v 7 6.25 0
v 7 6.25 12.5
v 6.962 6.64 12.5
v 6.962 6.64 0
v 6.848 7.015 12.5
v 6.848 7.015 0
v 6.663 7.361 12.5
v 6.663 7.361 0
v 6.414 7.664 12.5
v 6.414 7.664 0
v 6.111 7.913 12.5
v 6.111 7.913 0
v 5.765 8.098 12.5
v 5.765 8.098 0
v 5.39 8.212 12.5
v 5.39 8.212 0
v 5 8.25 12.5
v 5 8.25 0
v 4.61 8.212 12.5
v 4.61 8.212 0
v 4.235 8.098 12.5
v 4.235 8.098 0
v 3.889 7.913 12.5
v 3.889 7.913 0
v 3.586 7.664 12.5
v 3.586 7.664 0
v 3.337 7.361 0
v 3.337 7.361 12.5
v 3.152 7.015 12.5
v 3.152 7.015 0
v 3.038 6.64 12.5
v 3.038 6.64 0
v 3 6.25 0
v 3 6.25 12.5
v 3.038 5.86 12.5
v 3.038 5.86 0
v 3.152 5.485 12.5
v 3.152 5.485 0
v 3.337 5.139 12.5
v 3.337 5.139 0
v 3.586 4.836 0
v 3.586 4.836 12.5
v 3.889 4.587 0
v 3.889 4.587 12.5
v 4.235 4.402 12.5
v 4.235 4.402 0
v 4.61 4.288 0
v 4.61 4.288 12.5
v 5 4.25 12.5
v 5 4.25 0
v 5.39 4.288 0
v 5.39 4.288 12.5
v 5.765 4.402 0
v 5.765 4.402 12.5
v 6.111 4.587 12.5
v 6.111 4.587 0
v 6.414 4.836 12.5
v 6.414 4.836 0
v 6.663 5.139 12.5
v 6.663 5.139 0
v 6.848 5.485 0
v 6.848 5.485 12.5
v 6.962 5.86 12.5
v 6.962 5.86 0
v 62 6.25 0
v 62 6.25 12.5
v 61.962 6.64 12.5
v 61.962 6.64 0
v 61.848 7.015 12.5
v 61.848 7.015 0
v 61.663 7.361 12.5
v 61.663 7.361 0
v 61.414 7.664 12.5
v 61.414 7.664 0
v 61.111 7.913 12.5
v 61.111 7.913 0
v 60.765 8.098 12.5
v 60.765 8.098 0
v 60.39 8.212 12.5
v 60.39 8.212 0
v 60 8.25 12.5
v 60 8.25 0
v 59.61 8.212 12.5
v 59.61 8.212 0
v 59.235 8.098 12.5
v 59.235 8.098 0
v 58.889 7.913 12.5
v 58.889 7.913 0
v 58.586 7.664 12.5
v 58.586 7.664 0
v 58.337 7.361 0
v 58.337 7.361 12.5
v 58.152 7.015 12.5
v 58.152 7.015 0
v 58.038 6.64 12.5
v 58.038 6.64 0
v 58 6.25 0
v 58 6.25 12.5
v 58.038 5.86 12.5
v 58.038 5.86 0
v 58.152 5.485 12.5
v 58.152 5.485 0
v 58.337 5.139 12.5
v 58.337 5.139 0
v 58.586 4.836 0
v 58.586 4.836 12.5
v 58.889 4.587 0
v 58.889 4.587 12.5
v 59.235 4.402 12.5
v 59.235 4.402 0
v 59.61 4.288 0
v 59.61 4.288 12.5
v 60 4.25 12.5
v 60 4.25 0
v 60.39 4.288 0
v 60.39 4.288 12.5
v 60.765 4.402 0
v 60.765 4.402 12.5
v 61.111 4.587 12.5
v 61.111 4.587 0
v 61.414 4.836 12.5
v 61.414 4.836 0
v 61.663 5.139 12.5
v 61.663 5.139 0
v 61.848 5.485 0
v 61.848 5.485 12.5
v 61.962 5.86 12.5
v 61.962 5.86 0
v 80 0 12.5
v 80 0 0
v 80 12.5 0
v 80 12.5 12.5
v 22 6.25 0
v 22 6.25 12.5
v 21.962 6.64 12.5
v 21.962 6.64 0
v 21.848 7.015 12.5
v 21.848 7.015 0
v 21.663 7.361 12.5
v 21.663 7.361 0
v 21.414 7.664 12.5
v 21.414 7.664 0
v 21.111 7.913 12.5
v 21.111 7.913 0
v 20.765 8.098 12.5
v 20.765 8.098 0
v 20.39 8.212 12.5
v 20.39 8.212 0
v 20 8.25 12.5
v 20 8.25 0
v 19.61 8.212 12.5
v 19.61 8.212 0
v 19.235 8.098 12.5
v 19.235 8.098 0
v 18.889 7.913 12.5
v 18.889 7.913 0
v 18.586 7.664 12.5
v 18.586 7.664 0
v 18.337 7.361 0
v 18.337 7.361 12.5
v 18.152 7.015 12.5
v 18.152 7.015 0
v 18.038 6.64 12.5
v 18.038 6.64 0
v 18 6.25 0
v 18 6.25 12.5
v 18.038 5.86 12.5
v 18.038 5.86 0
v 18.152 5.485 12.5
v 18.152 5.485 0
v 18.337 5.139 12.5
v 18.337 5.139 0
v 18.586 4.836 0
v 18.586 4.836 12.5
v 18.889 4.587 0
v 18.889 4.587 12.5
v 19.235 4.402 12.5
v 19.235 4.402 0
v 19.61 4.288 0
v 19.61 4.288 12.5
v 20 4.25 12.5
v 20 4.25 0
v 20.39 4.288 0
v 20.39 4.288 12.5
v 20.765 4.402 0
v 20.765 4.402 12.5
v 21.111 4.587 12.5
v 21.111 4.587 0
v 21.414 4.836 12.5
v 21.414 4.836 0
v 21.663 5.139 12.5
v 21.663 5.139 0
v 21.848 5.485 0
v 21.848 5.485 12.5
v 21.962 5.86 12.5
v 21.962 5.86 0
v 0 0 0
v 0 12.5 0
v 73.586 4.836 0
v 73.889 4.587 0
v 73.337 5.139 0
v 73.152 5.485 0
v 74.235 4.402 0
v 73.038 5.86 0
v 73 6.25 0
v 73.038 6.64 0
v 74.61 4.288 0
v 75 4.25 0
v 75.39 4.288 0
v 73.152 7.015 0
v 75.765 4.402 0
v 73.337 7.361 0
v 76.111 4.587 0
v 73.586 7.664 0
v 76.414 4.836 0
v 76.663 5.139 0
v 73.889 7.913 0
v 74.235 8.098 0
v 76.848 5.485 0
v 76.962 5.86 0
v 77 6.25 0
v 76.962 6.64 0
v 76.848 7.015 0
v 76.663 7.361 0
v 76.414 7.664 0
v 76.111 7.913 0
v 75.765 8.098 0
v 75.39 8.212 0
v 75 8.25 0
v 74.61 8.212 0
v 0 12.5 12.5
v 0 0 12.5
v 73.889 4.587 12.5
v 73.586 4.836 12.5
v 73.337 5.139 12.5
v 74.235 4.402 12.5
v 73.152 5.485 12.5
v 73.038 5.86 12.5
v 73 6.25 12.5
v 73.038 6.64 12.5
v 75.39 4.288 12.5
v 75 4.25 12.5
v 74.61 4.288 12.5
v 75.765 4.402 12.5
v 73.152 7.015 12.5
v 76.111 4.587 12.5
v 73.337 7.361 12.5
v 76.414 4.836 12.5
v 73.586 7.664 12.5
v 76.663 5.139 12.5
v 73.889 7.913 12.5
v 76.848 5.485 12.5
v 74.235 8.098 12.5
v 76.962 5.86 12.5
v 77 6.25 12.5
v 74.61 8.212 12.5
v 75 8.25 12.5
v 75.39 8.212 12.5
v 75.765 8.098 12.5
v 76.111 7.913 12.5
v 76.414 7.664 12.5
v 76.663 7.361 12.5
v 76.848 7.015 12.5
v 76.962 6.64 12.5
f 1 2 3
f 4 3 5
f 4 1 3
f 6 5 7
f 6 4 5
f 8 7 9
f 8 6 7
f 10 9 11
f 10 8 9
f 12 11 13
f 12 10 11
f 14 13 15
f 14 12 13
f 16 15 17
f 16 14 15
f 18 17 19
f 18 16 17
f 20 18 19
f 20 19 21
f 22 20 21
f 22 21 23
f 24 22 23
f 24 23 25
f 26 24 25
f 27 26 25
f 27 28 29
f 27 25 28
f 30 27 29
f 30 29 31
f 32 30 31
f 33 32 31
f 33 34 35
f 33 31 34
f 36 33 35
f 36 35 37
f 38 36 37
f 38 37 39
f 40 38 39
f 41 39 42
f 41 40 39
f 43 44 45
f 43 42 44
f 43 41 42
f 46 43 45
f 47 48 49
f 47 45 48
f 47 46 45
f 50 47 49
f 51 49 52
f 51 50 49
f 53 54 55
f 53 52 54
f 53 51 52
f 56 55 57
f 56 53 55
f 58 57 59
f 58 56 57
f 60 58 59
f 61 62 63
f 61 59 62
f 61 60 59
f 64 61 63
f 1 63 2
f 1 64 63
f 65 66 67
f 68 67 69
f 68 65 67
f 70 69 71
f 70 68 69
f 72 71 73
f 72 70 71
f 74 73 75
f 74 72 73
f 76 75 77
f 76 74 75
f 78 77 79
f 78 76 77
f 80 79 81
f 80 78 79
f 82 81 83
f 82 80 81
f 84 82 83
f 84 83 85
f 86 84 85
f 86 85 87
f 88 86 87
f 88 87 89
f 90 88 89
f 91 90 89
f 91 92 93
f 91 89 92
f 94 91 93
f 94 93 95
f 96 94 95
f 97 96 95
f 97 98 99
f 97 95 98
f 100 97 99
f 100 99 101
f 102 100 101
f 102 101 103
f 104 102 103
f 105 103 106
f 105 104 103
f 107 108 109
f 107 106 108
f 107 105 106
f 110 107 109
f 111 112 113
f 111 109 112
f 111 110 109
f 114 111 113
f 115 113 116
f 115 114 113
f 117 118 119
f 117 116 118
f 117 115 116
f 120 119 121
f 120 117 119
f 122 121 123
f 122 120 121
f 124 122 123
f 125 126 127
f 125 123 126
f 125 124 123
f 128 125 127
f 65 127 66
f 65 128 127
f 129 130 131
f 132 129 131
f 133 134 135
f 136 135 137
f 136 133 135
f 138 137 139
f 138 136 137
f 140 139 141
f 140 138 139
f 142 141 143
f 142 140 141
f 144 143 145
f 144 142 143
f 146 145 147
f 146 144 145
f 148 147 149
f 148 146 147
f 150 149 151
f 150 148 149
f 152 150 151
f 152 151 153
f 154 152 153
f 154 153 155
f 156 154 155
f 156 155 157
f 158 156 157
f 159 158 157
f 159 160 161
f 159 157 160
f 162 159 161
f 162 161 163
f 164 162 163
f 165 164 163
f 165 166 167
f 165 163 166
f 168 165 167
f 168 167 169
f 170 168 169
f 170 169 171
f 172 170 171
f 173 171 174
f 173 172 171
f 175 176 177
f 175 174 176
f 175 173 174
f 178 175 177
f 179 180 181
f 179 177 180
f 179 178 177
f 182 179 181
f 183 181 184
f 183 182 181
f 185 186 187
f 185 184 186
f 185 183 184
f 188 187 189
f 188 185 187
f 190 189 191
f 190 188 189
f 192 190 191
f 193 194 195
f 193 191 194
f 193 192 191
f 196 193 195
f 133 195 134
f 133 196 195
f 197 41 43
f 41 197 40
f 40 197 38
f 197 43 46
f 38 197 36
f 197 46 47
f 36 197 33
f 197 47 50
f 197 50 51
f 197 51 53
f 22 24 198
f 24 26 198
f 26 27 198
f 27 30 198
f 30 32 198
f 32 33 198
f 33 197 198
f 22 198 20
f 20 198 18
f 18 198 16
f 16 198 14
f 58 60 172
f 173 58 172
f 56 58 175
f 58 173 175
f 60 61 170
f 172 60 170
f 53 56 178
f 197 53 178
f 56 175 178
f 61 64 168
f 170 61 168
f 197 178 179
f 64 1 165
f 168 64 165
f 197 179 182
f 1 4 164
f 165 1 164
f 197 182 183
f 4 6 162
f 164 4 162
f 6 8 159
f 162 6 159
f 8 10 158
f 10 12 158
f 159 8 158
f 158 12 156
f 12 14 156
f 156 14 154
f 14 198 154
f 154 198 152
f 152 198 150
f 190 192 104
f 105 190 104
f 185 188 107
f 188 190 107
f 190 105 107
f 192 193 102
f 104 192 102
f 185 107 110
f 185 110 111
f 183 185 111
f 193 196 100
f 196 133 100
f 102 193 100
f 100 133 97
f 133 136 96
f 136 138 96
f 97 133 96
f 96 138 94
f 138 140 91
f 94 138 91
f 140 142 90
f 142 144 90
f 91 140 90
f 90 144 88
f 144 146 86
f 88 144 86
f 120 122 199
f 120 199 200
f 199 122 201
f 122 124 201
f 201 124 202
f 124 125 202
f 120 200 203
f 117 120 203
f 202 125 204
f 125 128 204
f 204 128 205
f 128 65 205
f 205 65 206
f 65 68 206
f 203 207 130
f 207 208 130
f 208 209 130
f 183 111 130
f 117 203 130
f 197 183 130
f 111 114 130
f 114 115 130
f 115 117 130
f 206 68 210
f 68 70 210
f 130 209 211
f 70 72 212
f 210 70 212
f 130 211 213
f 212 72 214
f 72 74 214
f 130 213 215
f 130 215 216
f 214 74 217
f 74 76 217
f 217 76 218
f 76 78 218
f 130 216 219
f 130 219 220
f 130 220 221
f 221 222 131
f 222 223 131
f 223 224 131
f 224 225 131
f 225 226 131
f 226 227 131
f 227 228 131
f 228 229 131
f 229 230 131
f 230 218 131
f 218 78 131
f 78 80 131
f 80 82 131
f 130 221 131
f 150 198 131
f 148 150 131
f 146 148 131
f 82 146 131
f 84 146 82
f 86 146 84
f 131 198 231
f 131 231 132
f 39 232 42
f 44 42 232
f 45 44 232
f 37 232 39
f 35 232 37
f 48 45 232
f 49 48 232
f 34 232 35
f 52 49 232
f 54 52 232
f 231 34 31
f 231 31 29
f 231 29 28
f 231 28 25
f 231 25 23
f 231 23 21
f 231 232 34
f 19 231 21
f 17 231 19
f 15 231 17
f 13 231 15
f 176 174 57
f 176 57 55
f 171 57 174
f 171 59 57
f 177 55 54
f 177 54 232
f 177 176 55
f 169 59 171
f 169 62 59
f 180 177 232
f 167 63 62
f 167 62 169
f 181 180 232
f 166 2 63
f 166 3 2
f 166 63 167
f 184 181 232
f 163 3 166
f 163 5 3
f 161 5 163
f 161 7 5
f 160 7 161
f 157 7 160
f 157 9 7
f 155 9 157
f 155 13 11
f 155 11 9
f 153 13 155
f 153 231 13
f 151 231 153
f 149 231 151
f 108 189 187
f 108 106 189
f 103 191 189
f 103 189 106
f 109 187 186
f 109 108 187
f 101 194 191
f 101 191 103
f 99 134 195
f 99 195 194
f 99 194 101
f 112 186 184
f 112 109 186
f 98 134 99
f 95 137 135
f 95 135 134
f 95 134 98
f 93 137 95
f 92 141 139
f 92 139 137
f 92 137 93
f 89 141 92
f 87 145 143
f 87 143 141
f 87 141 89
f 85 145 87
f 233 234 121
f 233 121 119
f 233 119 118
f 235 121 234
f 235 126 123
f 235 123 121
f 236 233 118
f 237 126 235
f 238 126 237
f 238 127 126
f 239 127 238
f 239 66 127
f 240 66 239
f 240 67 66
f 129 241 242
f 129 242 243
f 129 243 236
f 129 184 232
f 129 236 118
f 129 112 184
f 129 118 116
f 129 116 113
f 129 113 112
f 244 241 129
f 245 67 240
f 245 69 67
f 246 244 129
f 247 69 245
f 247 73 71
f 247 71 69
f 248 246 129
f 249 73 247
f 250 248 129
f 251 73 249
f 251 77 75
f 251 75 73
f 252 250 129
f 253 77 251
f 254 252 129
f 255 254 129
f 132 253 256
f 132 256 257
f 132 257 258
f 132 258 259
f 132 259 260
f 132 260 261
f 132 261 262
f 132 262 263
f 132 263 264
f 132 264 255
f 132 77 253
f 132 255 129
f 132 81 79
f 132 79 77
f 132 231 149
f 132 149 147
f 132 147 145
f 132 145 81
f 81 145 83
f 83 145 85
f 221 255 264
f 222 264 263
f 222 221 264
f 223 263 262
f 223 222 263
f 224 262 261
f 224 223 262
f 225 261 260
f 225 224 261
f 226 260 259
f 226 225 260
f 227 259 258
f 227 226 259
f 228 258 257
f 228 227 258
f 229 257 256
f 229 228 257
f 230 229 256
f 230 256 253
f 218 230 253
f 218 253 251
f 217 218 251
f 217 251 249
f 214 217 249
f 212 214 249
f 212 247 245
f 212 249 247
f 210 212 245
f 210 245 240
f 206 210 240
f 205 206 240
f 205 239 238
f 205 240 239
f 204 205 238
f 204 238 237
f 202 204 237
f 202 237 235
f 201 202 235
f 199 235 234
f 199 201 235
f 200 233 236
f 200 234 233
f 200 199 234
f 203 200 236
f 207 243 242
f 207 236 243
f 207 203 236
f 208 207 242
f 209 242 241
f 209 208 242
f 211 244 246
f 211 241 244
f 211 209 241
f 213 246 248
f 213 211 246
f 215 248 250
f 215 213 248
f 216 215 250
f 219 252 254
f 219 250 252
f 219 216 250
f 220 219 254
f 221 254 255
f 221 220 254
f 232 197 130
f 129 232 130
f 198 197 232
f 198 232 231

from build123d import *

# Parameters (mm, degrees)
CYLINDER001_R     = 2
CYLINDER001_DEPTH = 13
CYLINDER002_R     = 2
CYLINDER002_DEPTH = 13
CYLINDER003_R     = 2
CYLINDER003_DEPTH = 13
CYLINDER_R        = 2
CYLINDER_DEPTH    = 13
BOX_W             = 80
BOX_H             = 12.5
BOX_DEPTH         = 12.5


with BuildPart() as cylinder001:
    # Cylinder001 → Cylinder001 (new body)
    with BuildSketch(Plane(origin=(20, 6.25, 0), x_dir=(1, 0, 0), z_dir=(0, 0, 1))):
        Circle(CYLINDER001_R)
    extrude(amount=CYLINDER001_DEPTH)


with BuildPart() as cylinder002:
    # Cylinder002 → Cylinder002 (new body)
    with BuildSketch(Plane(origin=(75, 6.25, 0), x_dir=(1, 0, 0), z_dir=(0, 0, 1))):
        Circle(CYLINDER002_R)
    extrude(amount=CYLINDER002_DEPTH)


with BuildPart() as cylinder003:
    # Cylinder003 → Cylinder003 (new body)
    with BuildSketch(Plane(origin=(60, 6.25, 0), x_dir=(1, 0, 0), z_dir=(0, 0, 1))):
        Circle(CYLINDER003_R)
    extrude(amount=CYLINDER003_DEPTH)


with BuildPart() as agujeroseje:
    # Cylinder → Cylinder (new body)
    with BuildSketch(Plane(origin=(5, 6.25, 0), x_dir=(1, 0, 0), z_dir=(0, 0, 1))):
        Circle(CYLINDER_R)
    extrude(amount=CYLINDER_DEPTH)

    # Compound: union Cylinder001, Cylinder002, Cylinder003
    add(cylinder001.part)
    add(cylinder002.part)
    add(cylinder003.part)


with BuildPart() as eje:
    # Box → Box (new body)
    with BuildSketch(Plane.XY):
        with Locations((40, 6.25)):
            Rectangle(BOX_W, BOX_H)
    extrude(amount=BOX_DEPTH)

    # Cut: cut AgujerosEje
    add(agujeroseje.part, mode=Mode.SUBTRACT)


solid = eje.part
